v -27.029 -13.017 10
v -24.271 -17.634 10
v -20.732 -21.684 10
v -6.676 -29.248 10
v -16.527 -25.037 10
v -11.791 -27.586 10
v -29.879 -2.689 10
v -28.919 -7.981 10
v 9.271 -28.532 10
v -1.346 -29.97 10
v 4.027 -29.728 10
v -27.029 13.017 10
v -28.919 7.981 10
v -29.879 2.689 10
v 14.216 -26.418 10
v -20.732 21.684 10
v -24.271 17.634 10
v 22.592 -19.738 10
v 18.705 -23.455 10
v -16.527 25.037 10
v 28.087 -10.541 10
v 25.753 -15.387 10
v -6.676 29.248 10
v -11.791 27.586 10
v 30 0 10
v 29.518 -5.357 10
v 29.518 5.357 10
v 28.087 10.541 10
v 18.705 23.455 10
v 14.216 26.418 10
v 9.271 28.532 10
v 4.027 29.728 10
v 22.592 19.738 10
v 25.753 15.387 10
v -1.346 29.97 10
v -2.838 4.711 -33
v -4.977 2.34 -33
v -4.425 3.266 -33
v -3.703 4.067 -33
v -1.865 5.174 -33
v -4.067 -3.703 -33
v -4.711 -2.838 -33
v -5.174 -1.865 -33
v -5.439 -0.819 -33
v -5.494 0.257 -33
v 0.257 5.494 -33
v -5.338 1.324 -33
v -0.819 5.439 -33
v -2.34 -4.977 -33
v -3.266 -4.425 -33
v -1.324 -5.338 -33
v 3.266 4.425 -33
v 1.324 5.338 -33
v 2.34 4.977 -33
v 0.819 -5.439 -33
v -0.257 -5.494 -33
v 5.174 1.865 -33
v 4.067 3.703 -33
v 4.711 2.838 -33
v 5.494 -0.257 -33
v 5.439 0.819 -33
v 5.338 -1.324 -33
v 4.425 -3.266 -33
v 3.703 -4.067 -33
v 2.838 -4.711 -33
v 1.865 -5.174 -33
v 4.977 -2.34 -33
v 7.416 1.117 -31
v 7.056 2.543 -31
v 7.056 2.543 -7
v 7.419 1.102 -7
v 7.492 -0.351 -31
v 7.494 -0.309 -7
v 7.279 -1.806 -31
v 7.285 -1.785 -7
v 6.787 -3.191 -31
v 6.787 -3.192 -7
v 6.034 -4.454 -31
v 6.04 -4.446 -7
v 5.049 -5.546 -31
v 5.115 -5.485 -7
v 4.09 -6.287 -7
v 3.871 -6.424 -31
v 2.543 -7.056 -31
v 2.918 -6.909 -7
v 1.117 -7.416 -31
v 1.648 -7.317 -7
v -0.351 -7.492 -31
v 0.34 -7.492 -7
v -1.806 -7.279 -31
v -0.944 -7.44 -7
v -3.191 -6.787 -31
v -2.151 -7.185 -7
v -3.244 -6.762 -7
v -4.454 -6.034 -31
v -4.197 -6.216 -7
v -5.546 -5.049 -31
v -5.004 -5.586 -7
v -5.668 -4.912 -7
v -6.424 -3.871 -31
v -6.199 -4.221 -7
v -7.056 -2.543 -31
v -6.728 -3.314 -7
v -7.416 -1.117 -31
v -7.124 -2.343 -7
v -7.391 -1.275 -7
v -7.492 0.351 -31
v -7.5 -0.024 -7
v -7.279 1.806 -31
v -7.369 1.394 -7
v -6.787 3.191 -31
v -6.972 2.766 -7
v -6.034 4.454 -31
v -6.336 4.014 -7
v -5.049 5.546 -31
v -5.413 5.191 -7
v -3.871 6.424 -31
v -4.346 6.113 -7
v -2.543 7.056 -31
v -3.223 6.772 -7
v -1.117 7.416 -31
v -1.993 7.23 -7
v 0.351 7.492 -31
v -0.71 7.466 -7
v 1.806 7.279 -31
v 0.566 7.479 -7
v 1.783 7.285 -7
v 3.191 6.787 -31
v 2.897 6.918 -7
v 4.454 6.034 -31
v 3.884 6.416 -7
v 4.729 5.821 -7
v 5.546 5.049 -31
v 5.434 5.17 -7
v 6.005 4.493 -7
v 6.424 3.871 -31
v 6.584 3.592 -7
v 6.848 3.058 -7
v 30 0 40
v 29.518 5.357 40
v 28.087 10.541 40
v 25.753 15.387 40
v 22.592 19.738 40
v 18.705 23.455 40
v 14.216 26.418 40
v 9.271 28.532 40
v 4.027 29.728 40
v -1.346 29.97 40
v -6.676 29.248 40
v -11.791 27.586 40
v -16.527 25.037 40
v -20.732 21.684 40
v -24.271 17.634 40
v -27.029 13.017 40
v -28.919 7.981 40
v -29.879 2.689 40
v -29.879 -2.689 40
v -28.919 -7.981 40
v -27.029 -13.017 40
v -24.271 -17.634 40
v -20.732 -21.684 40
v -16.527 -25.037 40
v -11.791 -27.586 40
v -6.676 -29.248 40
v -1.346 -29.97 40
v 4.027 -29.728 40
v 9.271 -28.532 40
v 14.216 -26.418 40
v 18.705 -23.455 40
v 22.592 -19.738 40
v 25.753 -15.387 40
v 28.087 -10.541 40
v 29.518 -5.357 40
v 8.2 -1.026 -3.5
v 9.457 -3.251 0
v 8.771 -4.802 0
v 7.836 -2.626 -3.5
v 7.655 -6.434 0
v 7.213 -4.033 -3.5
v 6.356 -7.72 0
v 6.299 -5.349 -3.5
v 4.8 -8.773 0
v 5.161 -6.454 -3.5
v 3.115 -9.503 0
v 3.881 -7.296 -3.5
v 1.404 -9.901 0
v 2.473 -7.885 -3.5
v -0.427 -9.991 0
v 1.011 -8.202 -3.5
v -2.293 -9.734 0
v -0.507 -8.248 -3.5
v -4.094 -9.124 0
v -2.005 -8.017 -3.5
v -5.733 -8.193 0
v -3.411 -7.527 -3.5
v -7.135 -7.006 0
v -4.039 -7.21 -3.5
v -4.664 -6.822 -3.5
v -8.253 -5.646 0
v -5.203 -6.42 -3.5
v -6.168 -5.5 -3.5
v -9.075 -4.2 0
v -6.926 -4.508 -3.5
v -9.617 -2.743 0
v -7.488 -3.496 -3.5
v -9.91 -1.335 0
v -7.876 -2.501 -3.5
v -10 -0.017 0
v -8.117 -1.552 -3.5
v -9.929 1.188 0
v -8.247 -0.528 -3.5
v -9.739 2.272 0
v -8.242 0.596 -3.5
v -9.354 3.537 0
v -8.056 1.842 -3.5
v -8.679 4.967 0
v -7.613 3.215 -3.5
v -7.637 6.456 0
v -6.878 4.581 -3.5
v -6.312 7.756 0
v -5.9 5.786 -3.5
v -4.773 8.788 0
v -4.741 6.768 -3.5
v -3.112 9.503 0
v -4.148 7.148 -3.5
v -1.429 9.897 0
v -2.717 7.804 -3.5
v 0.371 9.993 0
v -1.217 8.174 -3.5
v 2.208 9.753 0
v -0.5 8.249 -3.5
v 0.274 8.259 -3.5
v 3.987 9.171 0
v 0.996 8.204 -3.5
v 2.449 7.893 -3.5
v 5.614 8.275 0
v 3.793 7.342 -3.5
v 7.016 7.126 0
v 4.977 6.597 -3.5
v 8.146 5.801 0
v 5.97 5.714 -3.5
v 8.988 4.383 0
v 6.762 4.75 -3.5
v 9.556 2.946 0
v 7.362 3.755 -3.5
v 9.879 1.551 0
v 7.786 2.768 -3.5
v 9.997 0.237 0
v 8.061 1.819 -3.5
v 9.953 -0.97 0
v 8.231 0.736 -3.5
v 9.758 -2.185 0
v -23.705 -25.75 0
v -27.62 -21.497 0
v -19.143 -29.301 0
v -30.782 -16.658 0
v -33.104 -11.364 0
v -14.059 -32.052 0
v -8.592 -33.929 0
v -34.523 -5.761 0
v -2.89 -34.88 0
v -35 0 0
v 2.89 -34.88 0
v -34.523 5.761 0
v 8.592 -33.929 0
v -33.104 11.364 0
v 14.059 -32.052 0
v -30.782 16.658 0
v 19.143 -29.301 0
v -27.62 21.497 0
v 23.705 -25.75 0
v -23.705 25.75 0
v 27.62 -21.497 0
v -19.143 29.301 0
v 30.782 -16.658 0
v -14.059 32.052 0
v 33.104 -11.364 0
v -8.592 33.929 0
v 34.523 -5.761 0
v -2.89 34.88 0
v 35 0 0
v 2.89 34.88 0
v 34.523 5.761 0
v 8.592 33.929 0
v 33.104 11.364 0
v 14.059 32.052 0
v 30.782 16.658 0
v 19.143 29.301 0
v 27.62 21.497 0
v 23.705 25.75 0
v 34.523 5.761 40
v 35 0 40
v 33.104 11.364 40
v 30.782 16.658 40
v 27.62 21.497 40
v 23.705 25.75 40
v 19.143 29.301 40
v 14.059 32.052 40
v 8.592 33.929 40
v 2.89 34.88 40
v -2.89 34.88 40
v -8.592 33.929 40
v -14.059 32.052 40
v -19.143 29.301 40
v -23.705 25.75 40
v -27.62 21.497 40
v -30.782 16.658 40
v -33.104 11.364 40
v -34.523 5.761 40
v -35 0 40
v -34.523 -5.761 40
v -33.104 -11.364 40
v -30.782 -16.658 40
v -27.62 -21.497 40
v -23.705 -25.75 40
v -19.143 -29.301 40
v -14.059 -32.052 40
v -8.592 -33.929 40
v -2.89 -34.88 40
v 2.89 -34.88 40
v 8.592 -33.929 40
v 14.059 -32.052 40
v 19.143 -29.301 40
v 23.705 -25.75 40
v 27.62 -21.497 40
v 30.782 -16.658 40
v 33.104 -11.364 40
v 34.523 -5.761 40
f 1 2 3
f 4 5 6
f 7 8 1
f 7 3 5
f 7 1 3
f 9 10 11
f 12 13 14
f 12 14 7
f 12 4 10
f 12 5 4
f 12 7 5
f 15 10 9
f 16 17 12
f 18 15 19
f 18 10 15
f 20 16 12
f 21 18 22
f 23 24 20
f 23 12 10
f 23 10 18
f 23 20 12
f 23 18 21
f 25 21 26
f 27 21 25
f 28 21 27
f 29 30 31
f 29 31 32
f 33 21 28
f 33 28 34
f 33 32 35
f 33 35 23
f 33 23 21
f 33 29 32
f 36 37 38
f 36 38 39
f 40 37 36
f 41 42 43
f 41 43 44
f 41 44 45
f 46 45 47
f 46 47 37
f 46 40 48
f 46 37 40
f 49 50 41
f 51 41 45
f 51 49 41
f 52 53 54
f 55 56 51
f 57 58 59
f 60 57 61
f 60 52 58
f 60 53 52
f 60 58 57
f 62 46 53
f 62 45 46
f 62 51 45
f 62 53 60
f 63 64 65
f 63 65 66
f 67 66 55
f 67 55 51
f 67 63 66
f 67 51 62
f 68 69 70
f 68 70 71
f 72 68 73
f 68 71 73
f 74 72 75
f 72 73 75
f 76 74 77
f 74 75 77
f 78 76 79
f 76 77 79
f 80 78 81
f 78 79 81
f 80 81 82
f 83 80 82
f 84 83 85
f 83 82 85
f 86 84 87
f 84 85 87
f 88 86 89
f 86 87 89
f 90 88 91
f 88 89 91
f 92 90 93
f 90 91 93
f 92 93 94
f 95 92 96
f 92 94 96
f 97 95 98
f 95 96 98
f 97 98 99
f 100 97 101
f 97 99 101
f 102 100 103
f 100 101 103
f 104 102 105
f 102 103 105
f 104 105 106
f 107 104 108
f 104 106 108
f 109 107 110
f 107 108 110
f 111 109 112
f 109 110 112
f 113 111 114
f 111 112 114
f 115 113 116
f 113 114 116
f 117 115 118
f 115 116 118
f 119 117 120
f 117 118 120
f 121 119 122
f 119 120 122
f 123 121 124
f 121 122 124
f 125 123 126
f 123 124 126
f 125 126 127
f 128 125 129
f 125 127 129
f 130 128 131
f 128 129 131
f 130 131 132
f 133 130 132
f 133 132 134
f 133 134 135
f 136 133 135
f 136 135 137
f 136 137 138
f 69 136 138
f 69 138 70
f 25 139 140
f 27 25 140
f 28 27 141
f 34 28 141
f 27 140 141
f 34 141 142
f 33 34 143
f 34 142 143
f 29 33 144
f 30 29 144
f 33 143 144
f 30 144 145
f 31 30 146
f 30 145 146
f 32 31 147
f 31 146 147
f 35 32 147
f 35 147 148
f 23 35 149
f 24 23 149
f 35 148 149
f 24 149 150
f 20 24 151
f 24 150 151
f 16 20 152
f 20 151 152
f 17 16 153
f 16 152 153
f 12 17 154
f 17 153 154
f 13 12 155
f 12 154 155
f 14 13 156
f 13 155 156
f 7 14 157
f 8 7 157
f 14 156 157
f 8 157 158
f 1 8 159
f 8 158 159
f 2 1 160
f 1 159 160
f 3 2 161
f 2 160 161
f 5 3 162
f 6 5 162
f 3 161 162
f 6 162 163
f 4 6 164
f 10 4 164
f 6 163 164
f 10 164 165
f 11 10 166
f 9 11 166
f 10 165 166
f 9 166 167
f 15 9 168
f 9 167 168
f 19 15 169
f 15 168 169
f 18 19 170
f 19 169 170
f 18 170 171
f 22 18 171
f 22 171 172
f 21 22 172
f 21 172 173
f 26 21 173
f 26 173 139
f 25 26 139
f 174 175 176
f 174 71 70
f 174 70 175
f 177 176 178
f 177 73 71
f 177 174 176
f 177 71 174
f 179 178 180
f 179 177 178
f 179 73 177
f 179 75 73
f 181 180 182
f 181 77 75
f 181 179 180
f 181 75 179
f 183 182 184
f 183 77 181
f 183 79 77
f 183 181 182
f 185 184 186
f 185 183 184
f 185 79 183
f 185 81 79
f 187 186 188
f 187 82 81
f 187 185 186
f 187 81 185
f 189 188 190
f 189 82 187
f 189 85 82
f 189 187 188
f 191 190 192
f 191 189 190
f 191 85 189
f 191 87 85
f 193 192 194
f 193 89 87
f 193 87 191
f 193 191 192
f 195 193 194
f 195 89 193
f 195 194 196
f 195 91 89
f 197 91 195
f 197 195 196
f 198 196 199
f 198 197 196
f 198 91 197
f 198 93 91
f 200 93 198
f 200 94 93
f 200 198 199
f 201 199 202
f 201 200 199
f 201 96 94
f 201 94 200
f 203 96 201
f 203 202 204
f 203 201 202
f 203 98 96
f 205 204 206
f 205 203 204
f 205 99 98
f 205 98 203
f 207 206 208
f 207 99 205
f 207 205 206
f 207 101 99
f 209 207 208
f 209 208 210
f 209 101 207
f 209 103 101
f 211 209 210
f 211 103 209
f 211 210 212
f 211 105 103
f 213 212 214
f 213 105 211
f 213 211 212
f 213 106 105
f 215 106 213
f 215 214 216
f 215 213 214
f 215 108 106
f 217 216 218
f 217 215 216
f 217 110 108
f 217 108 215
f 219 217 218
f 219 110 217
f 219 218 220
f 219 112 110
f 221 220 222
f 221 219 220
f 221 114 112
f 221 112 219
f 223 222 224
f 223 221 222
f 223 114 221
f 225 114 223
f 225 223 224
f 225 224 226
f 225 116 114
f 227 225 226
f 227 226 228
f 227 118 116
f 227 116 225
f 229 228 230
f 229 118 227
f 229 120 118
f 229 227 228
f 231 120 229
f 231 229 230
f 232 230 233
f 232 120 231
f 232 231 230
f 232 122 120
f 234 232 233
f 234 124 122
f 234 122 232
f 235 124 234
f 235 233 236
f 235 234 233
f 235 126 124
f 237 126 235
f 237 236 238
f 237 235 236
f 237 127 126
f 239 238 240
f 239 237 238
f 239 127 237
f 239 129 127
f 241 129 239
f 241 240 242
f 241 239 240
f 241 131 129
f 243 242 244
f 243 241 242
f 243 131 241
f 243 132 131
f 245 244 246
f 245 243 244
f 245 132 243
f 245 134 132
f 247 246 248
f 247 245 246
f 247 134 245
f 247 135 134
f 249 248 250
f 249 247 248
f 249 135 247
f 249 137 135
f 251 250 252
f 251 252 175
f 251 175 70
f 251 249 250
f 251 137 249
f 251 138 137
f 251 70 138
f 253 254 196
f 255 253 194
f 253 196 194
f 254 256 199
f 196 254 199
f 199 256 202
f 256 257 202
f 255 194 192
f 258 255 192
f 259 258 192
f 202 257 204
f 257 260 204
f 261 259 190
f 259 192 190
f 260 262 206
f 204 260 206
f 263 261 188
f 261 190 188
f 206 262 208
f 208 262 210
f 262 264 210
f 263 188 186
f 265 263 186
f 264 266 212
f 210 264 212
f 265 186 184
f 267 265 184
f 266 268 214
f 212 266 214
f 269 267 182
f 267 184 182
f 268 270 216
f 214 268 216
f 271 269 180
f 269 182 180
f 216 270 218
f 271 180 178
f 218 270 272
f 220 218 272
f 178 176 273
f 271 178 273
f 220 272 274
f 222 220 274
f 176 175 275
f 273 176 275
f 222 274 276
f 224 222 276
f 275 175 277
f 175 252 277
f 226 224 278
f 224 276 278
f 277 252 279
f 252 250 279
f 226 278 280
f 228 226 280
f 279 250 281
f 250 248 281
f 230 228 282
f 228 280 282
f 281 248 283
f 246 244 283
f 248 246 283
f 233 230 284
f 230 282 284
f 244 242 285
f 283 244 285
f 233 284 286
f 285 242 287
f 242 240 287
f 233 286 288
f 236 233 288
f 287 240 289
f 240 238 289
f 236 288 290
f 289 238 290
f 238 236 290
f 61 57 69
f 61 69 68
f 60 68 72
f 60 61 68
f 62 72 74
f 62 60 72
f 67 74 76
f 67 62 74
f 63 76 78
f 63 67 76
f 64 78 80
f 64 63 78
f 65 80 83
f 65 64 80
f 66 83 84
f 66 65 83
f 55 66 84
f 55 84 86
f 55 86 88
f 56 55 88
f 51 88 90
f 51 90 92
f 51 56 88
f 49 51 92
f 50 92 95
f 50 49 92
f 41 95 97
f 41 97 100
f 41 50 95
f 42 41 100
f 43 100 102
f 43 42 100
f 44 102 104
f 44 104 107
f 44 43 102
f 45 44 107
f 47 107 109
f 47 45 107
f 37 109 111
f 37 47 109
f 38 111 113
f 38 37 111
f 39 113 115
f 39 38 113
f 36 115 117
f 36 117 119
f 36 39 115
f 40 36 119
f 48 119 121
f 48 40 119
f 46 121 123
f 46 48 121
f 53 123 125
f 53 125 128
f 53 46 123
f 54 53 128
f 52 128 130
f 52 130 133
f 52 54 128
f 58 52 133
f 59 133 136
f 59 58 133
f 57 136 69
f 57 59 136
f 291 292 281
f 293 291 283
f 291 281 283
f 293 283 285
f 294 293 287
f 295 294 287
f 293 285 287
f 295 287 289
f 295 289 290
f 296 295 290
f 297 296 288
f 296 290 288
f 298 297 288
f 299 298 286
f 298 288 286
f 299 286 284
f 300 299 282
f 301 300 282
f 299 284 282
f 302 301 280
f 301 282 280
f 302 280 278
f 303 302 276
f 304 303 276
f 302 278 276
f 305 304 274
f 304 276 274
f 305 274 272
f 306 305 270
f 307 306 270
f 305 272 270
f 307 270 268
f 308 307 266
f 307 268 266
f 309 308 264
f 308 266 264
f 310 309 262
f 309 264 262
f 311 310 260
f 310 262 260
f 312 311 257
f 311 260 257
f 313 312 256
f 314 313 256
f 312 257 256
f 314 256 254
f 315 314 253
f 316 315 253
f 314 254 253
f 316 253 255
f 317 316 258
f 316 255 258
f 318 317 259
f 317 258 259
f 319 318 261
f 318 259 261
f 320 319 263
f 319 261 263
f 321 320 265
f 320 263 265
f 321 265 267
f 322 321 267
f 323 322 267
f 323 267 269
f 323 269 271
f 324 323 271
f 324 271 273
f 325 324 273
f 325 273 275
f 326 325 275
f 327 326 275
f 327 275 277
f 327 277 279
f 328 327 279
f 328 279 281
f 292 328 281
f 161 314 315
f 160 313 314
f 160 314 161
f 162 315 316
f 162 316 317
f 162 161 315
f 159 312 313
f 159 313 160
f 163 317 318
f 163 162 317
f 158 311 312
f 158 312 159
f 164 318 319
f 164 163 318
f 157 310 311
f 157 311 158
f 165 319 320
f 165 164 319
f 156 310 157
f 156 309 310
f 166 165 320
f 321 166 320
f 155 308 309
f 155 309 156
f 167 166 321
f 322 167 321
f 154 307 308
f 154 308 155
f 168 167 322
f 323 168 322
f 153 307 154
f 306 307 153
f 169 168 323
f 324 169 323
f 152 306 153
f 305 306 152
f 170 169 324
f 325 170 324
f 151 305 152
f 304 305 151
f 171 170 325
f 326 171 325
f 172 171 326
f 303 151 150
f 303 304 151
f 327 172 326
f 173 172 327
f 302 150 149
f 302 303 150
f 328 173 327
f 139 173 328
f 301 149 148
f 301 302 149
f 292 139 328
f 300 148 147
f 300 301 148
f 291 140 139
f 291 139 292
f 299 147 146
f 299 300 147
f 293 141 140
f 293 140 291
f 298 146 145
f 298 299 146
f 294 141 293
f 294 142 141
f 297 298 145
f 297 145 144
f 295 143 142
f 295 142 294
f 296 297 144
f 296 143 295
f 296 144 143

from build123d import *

# Parameters (mm, degrees)
SKETCH1_R           = 35
BOSS_EXTRUDE1_DEPTH = 35
SKETCH2_R           = 35
BOSS_EXTRUDE2_DEPTH = 5
SKETCH7_R           = 7.5
BOSS_EXTRUDE5_DEPTH = 26
CHAMFER1_SIZE       = 2
SKETCH8_R           = 18.7
CUT_EXTRUDE1_DEPTH  = 22
SKETCH11_R          = 30
CUT_EXTRUDE2_DEPTH  = 30


with BuildPart() as part:
    # Sketch1 → Boss-Extrude1 (new body)
    with BuildSketch(Plane.XY):
        Circle(SKETCH1_R)
    extrude(amount=BOSS_EXTRUDE1_DEPTH)

    # Sketch2 → Boss-Extrude2 (add)
    with BuildSketch(Plane.XY.offset(35)):
        Circle(SKETCH2_R)
    extrude(amount=BOSS_EXTRUDE2_DEPTH)

    # Loft1: read off the stored shape, not the designer's step
    # Loft1: loft between two sections, ruled curve by curve
    loft1_from = [
        Edge.make_bspline([(9.456775653, -3.251060481, 0), (2.954654692, -22.164611787, 0), (-15.958896614, -15.662490826, 0), (-9.456775653, 3.251060481, 0), (-2.954654692, 22.164611787, 0), (15.958896614, 15.662490826, 0), (9.456775653, -3.251060481, 0)], [0, 0, 0, 0, 0.5, 0.5, 0.5, 1, 1, 1, 1], 3, [1, 0.333333333, 0.333333333, 1, 0.333333333, 0.333333333, 1]),
    ]
    loft1_to = [
        Edge.make_bspline([(7.055763885, 2.542871605, -7), (12.141507096, -11.568656164, -7), (-1.970020674, -16.654399375, -7), (-7.055763885, -2.542871605, -7), (-12.141507096, 11.568656164, -7), (1.970020674, 16.654399375, -7), (7.055763885, 2.542871605, -7)], [0, 0, 0, 0, 0.5, 0.5, 0.5, 1, 1, 1, 1], 3, [1, 0.333333333, 0.333333333, 1, 0.333333333, 0.333333333, 1]),
    ]
    loft1 = Solid(Shell([*[Face.make_surface_from_curves(loft1_from[k], loft1_to[k]) for k in range(1)], Face(Wire(loft1_from)), Face(Wire(loft1_to))]))
    add(loft1)

    # Sketch7 → Boss-Extrude5 (add)
    with BuildSketch(Plane(origin=(0, 0, -7), x_dir=(-1, 0, 0), z_dir=(0, 0, -1))):
        with Locations(Location((0, 0, 0), (0, 0, 160.181022053))):
            Circle(SKETCH7_R)
    extrude(amount=BOSS_EXTRUDE5_DEPTH)

    # Chamfer1
    chamfer1_edges = [part.edges().sort_by_distance(p)[0] for p in [
        (-7.055763885, -2.542871605, -33),
    ]]
    chamfer(chamfer1_edges, length=CHAMFER1_SIZE)

    # Sketch8 → Cut-Extrude1 (cut)
    with BuildSketch(Plane.XY.offset(40)):
        Circle(SKETCH8_R)
    extrude(amount=-CUT_EXTRUDE1_DEPTH, mode=Mode.SUBTRACT)

    # Sketch11 → Cut-Extrude2 (cut)
    with BuildSketch(Plane.XY.offset(40)):
        Circle(SKETCH11_R)
    extrude(amount=-CUT_EXTRUDE2_DEPTH, mode=Mode.SUBTRACT)


solid = part.part
